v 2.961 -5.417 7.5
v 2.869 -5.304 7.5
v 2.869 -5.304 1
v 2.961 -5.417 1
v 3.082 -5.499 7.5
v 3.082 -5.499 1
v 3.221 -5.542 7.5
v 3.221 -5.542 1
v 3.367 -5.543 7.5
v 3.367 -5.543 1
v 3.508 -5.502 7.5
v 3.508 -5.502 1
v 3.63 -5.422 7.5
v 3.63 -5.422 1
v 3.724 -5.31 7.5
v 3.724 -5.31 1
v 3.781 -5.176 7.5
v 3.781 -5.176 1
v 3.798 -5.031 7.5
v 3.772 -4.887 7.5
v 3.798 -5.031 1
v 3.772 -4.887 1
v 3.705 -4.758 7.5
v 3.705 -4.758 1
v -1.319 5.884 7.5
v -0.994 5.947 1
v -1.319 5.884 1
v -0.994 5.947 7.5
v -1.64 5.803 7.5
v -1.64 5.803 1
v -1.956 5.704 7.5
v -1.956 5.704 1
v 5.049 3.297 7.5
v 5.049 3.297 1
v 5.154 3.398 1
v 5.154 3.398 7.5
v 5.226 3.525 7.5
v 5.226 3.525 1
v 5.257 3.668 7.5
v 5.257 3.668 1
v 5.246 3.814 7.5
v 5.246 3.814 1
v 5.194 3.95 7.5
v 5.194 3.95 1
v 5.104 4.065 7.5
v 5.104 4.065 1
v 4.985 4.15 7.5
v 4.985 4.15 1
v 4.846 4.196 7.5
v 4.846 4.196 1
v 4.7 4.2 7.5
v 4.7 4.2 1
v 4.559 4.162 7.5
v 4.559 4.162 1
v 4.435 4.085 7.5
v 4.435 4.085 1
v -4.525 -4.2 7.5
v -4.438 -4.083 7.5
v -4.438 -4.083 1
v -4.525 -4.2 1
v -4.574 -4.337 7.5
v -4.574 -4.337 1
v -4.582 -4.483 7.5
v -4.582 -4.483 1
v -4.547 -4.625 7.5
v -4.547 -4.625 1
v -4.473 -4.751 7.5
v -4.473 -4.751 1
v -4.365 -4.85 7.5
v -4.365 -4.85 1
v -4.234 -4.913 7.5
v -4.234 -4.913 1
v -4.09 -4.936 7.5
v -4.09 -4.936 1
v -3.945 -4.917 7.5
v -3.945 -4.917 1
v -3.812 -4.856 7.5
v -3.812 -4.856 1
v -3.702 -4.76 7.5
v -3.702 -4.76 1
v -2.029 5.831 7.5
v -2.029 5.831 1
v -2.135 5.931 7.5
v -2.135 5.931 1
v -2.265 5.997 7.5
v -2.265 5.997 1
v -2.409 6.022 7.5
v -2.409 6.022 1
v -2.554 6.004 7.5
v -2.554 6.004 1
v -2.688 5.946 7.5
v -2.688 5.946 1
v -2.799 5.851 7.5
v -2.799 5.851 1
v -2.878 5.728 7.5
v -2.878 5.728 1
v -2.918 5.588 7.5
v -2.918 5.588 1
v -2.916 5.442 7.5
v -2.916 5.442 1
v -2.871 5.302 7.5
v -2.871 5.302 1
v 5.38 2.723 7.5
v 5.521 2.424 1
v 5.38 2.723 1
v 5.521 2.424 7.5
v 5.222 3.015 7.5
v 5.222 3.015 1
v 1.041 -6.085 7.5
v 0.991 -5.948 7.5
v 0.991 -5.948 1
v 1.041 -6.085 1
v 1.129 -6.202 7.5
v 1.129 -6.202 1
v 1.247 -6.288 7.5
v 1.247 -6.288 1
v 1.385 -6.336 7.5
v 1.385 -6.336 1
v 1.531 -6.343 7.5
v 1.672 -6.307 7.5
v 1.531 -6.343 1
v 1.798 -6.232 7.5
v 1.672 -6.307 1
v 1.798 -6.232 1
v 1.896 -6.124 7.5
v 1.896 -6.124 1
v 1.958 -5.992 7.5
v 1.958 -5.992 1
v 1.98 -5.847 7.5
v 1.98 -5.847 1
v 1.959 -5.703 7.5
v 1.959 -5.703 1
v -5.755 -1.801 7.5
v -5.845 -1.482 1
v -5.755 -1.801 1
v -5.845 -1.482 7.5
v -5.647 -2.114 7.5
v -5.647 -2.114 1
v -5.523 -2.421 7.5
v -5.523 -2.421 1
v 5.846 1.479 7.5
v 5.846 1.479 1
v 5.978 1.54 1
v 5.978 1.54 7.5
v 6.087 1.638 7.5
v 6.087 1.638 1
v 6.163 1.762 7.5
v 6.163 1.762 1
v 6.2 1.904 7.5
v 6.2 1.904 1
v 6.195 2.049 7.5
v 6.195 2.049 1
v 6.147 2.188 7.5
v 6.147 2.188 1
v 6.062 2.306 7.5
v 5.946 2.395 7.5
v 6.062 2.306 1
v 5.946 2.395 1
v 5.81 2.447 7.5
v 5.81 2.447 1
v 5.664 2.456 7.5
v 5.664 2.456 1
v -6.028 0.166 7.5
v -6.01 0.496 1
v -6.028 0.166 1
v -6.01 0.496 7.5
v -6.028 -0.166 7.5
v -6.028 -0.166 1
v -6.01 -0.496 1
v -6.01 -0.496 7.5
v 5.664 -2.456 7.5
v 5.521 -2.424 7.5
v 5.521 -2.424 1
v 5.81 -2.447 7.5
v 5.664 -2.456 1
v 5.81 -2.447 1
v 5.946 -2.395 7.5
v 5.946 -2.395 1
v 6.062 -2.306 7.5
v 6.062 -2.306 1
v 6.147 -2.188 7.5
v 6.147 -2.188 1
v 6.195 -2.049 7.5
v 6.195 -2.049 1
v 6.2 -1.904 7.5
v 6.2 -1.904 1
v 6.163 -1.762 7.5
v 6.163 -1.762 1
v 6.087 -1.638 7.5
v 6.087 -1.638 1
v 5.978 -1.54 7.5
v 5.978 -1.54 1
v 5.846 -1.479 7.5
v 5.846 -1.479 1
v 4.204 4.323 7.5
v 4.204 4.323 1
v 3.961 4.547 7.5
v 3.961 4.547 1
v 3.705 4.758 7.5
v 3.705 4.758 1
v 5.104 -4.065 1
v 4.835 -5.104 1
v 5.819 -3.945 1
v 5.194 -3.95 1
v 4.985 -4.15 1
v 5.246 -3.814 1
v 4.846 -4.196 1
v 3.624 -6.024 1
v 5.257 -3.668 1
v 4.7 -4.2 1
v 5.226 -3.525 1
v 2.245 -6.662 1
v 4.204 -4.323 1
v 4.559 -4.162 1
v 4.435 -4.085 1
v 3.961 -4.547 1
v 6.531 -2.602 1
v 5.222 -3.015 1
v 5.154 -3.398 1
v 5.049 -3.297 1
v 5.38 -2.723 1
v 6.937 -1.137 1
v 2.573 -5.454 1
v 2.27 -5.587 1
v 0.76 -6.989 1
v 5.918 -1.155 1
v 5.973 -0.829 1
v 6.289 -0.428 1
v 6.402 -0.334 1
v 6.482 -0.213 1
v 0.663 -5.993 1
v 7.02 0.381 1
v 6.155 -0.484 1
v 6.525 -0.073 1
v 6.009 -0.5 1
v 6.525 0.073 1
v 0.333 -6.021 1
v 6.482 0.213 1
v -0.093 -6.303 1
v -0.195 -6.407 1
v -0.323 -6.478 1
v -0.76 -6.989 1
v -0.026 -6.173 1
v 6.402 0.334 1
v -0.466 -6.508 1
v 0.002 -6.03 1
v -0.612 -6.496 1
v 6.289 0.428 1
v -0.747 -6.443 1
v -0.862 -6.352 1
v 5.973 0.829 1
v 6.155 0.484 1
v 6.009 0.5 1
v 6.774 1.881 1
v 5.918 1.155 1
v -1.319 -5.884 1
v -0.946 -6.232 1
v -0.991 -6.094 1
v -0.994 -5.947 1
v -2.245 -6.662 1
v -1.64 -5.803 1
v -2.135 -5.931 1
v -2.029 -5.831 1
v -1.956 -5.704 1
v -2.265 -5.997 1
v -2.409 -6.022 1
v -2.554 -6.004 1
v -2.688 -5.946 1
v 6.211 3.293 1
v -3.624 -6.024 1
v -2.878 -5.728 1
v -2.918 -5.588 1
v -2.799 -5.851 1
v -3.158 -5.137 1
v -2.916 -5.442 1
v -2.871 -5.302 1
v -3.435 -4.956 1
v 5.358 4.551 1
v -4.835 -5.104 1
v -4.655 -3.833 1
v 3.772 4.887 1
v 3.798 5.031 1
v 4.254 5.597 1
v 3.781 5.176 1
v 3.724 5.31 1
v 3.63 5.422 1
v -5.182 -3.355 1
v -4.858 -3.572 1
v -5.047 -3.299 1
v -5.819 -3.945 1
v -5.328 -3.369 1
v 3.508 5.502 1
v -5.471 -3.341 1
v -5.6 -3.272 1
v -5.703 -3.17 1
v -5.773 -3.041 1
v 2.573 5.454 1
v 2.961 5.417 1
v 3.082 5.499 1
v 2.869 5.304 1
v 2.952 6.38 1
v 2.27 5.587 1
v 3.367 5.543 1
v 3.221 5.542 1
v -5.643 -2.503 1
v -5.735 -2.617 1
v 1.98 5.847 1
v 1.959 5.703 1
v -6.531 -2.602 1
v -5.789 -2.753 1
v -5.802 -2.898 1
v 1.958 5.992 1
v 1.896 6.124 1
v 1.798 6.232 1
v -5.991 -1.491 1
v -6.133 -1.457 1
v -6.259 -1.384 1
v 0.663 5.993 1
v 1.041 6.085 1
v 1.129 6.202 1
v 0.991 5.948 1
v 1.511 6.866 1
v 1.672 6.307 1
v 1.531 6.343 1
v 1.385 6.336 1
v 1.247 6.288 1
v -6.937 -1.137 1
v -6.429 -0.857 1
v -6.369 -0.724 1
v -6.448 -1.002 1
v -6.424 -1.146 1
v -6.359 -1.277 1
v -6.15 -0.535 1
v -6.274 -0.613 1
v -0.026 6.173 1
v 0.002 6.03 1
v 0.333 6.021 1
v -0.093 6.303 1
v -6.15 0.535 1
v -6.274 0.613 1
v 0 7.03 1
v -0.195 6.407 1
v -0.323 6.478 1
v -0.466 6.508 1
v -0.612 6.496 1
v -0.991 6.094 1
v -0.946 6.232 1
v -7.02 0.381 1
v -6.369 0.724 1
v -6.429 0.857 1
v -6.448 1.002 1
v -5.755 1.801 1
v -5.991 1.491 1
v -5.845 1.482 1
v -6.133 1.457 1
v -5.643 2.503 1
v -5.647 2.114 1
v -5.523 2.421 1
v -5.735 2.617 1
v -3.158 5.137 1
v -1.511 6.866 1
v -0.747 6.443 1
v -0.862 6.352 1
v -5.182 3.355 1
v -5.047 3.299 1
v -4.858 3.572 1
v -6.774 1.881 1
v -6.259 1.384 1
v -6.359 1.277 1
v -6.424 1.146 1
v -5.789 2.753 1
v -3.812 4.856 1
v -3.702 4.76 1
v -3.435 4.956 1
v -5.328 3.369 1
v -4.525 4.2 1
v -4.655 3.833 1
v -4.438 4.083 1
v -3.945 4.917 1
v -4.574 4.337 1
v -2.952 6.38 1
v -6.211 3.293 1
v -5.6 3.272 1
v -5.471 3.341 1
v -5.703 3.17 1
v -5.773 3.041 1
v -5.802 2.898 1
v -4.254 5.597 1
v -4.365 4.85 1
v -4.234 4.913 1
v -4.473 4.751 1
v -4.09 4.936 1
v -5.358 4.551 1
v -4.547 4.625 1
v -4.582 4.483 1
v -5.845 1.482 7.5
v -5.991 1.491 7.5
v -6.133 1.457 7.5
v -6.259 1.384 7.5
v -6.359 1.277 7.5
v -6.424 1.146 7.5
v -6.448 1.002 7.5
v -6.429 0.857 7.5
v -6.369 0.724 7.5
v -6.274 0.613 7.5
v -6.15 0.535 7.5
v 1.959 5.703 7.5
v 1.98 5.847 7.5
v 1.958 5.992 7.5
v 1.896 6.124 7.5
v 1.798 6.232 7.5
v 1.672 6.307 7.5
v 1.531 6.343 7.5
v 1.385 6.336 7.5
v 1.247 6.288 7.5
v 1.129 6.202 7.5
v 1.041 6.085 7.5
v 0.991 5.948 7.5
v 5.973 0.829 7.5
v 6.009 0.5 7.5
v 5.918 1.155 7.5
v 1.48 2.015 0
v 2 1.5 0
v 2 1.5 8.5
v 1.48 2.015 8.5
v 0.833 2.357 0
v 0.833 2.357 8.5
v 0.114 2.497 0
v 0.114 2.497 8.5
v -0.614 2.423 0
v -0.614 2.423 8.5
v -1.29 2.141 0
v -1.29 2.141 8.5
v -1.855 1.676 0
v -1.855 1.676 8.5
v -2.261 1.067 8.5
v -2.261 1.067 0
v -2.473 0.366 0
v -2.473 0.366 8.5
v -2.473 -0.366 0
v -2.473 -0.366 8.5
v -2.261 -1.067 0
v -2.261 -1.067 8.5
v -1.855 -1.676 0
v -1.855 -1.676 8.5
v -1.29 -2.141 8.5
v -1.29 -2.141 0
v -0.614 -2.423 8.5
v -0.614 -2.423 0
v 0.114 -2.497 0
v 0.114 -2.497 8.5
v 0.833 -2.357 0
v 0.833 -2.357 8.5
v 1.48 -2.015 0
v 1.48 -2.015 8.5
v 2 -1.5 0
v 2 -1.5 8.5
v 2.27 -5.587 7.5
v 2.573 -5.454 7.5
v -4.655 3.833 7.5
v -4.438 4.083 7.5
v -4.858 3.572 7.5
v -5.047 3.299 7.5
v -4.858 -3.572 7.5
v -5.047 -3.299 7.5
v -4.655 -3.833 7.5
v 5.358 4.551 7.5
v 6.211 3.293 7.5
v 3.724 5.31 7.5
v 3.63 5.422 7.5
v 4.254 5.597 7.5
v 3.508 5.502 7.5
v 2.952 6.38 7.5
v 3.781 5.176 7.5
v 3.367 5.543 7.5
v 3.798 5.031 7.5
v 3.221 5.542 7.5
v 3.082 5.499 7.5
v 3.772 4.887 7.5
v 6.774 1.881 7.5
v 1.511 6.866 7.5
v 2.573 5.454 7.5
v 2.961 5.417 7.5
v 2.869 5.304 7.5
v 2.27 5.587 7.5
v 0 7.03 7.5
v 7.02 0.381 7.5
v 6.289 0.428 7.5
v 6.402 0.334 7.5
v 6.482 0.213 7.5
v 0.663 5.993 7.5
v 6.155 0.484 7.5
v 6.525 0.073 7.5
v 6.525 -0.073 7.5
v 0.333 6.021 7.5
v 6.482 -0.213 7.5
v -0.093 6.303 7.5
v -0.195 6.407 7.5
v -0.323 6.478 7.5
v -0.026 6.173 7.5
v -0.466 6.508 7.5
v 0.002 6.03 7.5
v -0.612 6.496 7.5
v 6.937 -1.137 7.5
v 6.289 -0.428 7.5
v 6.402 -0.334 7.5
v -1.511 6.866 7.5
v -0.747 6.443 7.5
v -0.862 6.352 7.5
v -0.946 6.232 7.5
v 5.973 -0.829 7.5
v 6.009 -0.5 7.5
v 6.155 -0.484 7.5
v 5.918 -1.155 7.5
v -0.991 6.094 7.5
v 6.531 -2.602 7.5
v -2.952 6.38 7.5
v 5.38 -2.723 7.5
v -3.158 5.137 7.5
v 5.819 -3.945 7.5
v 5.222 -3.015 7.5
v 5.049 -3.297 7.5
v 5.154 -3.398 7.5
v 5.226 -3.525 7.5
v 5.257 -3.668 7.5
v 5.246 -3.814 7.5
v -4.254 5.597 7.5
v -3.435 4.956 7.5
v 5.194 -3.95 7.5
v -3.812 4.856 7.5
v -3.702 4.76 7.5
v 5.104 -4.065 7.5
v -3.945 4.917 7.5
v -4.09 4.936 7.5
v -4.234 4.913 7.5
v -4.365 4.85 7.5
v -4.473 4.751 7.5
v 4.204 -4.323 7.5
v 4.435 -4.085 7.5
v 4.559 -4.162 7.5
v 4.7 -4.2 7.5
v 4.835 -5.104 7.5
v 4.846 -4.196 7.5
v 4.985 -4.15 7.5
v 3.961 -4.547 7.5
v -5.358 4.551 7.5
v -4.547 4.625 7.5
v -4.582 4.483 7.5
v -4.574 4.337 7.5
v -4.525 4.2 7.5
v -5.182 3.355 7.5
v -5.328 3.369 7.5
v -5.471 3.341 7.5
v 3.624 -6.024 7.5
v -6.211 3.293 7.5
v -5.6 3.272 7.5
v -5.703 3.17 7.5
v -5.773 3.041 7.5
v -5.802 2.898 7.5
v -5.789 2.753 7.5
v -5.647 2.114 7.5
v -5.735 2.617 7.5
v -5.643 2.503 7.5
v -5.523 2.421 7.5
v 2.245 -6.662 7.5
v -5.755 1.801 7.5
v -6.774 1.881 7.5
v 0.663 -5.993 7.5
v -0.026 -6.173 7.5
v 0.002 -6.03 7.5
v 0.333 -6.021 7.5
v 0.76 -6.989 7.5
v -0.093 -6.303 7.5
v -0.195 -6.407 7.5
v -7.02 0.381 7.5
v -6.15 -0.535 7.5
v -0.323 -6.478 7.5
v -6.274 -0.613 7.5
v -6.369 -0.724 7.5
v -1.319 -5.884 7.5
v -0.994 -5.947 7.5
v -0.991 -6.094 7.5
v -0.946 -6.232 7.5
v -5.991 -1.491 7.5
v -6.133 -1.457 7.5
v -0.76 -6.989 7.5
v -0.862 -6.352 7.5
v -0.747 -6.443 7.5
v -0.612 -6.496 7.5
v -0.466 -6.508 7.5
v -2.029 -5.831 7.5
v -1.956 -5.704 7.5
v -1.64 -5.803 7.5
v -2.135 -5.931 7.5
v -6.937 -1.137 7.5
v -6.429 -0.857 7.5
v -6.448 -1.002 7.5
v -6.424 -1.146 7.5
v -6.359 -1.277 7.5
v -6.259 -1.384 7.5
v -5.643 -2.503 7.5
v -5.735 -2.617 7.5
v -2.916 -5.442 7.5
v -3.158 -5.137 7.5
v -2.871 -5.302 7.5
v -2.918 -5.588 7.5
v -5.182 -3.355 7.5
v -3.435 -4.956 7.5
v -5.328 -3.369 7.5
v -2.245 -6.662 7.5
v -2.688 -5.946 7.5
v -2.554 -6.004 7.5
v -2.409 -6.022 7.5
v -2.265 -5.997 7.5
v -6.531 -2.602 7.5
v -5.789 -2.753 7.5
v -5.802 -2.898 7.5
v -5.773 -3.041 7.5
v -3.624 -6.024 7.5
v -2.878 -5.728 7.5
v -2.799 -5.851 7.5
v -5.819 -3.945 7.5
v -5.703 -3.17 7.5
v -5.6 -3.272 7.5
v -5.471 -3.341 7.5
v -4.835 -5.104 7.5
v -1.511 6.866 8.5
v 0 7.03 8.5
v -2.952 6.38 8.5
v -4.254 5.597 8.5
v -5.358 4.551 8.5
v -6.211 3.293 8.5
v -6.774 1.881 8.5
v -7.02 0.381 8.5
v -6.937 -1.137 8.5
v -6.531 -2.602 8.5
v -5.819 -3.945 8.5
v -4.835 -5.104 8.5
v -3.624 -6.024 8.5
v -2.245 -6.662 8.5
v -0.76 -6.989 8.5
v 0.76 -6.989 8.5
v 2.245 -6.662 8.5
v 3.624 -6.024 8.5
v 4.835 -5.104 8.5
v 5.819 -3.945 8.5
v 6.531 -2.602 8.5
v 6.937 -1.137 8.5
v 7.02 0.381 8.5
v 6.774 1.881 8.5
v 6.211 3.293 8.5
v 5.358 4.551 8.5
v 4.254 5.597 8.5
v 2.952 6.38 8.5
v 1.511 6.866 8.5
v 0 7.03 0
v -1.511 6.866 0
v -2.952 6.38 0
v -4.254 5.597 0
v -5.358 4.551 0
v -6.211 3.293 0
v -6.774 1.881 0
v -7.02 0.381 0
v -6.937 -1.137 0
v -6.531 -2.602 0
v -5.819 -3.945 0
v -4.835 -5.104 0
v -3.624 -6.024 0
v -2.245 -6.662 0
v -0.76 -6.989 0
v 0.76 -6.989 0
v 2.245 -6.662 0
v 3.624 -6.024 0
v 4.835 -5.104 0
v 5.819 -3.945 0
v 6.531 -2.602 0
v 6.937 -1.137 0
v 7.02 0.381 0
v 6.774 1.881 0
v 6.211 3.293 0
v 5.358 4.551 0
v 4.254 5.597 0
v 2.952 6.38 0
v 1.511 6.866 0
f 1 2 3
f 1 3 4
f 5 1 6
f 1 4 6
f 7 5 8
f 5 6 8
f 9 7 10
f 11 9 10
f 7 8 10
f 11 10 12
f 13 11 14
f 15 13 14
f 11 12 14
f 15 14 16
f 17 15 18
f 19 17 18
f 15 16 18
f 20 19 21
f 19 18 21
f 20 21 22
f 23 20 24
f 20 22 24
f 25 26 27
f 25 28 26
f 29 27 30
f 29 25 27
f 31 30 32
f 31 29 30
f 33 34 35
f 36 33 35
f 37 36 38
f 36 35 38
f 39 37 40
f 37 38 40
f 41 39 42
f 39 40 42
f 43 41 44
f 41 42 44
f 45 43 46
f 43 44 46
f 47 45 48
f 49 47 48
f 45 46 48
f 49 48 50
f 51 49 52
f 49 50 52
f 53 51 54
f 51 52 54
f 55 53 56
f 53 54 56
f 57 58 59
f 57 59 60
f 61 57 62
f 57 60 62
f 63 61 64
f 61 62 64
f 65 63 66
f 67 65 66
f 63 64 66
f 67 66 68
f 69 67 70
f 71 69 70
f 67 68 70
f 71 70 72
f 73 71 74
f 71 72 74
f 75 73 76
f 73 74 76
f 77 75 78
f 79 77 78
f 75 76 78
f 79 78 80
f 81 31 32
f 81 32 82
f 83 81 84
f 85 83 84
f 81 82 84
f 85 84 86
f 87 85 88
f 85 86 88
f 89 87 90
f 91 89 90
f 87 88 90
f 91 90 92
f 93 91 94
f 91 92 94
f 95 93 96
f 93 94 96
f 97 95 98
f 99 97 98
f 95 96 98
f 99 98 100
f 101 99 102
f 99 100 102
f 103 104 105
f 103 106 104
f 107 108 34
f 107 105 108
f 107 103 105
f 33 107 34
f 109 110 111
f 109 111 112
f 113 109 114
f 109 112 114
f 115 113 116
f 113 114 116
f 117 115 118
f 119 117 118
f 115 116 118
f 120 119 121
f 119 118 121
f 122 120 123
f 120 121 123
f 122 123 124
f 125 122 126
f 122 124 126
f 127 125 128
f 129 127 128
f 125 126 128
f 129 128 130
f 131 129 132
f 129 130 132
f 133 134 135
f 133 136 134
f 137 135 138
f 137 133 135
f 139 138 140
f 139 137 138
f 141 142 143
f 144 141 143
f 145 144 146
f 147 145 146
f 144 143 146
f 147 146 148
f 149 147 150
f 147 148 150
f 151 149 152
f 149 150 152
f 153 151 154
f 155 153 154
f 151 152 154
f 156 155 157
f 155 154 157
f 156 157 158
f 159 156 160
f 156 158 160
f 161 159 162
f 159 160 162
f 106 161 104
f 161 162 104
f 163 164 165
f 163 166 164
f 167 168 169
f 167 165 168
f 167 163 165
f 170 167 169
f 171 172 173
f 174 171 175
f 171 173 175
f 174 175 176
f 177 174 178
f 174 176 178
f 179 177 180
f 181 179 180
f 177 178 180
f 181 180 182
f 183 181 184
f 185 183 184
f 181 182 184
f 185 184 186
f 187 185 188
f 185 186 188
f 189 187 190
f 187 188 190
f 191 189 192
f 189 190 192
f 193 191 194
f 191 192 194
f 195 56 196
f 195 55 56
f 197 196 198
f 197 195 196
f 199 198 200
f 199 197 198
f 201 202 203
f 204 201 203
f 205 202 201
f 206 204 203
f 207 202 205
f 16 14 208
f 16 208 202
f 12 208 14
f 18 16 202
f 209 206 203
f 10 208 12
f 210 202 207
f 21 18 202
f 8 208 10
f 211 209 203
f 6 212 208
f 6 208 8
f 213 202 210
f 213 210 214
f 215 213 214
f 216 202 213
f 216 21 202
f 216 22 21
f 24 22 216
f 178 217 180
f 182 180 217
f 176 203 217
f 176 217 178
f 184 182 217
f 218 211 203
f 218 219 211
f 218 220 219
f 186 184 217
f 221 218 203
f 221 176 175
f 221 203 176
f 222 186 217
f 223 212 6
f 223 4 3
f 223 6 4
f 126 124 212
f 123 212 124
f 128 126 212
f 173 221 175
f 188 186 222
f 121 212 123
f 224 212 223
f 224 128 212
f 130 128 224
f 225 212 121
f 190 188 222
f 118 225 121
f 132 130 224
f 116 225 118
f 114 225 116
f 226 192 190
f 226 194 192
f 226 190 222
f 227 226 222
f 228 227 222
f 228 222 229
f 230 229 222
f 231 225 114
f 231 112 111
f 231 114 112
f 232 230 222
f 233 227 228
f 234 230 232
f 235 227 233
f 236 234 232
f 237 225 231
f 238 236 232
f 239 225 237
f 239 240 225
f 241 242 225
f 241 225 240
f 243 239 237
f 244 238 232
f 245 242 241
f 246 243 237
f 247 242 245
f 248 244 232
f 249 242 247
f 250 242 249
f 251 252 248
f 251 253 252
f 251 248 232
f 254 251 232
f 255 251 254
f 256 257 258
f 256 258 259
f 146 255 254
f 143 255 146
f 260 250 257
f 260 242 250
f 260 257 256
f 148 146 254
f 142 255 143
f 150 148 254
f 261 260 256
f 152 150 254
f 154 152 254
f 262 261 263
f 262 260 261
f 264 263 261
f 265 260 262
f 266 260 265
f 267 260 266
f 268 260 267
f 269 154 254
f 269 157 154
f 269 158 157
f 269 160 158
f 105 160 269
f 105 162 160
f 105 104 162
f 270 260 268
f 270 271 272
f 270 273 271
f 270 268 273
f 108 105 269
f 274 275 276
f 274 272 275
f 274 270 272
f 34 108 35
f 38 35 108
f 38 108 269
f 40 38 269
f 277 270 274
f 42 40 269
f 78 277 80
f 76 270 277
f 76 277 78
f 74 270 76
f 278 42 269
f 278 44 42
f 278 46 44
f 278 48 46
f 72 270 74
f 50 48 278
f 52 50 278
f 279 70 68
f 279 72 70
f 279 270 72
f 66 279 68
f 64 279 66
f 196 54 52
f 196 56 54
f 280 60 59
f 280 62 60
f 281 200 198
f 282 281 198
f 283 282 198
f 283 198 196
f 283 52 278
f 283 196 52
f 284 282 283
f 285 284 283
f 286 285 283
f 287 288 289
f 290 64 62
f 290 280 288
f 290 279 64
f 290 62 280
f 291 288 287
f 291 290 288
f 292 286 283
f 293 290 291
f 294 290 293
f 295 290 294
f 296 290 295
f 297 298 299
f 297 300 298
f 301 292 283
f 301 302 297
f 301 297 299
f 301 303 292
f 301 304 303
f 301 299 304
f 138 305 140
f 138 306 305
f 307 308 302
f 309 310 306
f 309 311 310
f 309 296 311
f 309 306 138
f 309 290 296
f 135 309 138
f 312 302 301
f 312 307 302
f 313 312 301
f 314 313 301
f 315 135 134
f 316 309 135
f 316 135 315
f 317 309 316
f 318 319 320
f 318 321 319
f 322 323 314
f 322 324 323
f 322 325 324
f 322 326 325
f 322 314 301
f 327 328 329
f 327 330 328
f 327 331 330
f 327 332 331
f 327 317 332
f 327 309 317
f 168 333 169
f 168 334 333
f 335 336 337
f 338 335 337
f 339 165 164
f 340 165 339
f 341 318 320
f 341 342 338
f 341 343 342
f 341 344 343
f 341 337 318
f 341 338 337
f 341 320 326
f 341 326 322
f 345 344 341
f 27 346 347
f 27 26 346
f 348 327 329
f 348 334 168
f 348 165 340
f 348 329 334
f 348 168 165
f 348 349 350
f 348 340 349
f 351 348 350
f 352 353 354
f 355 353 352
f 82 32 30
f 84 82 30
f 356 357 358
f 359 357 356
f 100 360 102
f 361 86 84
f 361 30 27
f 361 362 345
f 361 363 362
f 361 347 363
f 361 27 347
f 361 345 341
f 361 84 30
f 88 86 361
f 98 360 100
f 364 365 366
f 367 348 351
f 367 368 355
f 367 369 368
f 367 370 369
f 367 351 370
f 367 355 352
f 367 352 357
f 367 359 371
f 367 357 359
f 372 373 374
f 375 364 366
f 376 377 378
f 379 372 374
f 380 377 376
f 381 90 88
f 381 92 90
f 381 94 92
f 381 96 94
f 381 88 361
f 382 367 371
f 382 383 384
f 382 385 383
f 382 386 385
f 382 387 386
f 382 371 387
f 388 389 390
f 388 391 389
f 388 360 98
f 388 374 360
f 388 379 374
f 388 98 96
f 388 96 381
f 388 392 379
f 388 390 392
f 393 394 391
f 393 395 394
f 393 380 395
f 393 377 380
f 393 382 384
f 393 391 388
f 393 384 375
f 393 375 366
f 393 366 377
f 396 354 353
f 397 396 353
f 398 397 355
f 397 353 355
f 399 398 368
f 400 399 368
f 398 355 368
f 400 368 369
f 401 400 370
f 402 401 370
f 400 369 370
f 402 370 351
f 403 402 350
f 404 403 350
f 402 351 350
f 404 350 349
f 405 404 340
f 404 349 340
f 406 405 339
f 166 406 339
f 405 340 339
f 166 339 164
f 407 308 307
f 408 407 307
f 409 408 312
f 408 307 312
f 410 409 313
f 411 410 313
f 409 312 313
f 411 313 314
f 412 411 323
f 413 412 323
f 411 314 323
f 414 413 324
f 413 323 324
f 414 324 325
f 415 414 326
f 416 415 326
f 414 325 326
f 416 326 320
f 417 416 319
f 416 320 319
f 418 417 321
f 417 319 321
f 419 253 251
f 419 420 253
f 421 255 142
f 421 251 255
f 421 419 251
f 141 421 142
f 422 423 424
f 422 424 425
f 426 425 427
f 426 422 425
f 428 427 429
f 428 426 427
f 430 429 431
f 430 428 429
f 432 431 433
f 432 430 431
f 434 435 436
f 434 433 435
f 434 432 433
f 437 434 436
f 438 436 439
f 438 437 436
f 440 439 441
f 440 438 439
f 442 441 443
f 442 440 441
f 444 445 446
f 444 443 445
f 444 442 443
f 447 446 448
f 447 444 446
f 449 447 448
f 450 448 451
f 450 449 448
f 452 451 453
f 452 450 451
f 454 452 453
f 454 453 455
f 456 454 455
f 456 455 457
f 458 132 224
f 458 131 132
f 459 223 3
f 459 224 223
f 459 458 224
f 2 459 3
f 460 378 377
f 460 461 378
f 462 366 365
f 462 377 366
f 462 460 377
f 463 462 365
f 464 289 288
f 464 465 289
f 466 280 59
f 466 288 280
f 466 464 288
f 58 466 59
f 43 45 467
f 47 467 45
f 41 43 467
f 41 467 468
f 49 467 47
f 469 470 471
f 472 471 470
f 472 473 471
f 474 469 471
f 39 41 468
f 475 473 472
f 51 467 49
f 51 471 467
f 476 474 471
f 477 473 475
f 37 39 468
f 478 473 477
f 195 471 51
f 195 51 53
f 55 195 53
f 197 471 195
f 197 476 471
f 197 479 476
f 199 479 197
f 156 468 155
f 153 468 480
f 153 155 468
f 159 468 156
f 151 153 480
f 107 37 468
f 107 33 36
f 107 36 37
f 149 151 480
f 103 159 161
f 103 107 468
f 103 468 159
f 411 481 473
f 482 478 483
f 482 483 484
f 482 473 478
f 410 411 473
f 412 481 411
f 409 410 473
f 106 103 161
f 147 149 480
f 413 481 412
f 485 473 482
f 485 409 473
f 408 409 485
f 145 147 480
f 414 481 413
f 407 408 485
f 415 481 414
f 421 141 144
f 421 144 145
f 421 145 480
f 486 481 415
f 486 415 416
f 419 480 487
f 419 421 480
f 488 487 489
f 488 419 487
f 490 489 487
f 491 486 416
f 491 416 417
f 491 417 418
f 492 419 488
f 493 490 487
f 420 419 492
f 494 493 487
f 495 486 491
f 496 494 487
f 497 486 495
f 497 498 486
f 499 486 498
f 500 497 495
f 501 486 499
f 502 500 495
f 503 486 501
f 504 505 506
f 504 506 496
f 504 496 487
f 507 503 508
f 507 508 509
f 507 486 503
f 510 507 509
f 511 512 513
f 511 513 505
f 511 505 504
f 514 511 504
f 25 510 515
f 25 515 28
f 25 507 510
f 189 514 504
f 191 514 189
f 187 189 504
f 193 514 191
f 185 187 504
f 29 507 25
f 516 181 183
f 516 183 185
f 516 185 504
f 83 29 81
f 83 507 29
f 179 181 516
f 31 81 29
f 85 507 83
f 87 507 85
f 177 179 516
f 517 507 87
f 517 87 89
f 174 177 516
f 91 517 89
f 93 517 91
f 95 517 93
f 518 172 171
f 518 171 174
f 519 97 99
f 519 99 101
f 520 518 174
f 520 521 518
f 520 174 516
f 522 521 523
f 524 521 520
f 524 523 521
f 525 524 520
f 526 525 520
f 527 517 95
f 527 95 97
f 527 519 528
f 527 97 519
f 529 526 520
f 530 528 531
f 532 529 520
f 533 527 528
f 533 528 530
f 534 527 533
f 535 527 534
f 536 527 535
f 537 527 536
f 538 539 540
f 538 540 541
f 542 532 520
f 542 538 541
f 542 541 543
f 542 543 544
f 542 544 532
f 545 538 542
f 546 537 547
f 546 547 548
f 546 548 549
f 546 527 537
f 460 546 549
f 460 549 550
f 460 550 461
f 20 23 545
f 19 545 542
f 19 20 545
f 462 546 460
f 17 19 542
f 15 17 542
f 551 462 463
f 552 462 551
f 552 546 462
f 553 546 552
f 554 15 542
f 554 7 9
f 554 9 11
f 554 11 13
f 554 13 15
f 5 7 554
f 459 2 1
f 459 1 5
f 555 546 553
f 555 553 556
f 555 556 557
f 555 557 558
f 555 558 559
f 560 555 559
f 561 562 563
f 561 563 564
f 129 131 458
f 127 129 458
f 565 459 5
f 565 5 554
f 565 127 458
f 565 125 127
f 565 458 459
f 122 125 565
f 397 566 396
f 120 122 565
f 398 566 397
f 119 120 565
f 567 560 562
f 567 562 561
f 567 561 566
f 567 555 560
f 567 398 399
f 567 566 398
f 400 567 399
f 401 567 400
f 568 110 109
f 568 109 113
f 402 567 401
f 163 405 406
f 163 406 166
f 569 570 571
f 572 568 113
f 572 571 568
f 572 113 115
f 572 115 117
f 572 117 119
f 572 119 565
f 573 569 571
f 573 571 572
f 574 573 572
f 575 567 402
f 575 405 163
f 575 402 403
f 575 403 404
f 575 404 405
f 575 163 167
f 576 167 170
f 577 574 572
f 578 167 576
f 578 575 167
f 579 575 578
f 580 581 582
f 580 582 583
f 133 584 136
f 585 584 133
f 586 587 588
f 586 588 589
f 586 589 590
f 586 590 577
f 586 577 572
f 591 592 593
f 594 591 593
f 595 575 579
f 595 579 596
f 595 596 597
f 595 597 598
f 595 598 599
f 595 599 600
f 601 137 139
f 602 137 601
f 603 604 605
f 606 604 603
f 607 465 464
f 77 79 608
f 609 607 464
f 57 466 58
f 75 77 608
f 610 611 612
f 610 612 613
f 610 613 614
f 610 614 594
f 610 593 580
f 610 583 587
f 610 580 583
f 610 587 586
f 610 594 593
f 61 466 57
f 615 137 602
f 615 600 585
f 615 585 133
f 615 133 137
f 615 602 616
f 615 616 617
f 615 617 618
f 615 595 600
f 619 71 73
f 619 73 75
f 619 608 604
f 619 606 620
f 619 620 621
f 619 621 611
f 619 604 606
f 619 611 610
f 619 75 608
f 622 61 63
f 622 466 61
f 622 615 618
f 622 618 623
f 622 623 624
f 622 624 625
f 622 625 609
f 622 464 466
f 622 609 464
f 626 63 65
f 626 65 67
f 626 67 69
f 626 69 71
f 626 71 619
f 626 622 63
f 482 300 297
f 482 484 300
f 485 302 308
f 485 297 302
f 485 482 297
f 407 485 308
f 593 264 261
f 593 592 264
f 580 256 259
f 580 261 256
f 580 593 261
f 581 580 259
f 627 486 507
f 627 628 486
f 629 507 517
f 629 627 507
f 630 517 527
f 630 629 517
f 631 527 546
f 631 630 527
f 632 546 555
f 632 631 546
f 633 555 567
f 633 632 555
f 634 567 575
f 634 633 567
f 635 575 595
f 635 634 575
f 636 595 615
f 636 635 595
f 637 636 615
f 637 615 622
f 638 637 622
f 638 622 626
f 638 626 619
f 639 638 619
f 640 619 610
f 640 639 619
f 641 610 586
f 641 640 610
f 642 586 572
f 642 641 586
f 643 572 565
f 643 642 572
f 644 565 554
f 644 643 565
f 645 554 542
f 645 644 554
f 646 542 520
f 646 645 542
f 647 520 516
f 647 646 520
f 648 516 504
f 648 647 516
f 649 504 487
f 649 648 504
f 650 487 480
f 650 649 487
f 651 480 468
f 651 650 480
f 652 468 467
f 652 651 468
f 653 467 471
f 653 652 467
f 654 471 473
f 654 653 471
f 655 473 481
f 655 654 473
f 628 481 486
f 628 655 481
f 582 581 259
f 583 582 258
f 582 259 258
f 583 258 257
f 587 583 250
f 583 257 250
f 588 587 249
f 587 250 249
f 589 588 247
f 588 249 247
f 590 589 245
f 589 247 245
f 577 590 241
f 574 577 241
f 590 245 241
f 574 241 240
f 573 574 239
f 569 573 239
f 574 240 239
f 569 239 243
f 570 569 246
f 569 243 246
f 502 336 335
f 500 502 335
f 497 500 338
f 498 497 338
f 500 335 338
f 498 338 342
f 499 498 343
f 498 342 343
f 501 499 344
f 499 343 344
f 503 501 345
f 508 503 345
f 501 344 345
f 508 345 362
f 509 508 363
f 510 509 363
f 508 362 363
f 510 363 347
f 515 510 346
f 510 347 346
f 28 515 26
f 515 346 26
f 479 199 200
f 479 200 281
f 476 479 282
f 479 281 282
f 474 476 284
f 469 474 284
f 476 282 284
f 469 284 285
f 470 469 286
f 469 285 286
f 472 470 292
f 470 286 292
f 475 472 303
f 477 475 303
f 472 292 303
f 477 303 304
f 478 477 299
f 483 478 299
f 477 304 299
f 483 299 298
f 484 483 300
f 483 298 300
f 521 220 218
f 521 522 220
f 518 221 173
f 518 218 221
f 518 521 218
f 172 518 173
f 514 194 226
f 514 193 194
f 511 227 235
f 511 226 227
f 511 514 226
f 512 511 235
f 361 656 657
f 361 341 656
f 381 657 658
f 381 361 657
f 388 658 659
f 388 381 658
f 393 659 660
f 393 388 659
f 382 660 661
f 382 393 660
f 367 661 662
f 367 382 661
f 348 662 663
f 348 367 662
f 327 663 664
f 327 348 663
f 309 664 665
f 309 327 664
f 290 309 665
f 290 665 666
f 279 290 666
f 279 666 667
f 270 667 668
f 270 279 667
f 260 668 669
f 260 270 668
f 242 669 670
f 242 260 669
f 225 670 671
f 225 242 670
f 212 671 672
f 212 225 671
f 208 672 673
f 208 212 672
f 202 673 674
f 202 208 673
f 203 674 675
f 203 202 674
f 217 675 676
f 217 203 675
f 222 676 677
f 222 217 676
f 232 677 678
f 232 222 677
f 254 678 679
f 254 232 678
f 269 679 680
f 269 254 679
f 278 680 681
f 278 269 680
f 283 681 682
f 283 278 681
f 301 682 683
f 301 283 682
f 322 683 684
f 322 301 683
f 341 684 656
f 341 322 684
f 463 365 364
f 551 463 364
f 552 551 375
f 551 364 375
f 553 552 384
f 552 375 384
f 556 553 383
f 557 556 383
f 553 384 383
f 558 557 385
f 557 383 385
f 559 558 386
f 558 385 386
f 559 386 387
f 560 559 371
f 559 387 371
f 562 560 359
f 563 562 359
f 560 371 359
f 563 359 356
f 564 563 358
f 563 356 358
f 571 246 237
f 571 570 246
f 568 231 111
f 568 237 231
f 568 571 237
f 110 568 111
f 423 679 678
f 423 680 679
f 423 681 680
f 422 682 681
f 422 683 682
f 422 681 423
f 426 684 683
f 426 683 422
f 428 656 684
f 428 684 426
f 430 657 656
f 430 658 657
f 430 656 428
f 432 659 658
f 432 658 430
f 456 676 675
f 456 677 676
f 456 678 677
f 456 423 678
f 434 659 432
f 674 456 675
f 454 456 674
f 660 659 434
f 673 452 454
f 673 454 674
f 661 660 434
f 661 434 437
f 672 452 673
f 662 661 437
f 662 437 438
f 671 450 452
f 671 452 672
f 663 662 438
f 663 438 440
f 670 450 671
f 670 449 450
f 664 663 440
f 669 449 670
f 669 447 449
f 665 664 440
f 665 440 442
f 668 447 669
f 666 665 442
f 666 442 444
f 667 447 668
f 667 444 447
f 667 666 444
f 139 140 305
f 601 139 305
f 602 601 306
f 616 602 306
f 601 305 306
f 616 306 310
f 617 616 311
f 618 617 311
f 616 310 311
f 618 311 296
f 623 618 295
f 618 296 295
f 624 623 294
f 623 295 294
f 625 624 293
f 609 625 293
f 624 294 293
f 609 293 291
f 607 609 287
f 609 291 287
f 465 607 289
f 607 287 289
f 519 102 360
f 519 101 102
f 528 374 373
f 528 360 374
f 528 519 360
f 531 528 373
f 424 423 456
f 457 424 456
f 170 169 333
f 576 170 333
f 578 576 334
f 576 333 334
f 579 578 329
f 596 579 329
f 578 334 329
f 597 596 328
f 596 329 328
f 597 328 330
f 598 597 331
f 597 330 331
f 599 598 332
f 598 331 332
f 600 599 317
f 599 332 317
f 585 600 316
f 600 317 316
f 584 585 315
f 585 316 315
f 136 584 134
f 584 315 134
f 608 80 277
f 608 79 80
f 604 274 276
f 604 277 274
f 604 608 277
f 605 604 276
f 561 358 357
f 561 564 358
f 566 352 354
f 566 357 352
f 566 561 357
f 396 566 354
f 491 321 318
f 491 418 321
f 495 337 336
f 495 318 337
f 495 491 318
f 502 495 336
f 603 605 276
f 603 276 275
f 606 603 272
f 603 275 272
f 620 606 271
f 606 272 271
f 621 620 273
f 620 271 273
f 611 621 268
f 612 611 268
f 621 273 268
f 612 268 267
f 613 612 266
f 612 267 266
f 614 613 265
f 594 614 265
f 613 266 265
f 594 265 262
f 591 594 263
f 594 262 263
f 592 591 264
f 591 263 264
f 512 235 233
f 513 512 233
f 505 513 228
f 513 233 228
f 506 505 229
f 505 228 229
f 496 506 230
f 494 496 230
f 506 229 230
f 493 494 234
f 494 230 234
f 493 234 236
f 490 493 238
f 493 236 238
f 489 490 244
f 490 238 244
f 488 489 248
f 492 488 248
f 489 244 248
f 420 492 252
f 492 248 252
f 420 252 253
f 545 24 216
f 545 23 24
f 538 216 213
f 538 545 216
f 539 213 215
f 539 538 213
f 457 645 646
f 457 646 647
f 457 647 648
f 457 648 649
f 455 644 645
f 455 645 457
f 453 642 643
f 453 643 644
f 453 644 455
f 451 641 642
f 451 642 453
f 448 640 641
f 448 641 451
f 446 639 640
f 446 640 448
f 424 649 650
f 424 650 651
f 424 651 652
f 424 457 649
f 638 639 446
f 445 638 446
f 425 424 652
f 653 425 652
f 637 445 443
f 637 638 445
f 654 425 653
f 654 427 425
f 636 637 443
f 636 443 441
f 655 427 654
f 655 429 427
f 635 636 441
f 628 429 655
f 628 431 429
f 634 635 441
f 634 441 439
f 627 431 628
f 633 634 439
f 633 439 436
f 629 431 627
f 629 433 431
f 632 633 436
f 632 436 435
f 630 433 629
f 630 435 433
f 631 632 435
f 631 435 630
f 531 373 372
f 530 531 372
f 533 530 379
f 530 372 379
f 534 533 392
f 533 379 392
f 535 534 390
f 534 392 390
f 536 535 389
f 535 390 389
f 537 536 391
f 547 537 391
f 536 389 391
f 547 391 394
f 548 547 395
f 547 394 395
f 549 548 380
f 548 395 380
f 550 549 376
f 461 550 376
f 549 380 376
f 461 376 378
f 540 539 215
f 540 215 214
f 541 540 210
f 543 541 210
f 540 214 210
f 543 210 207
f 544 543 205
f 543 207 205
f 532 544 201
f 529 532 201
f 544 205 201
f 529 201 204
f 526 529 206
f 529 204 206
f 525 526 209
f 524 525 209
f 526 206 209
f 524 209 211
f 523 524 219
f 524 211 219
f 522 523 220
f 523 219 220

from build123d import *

# Parameters (mm, degrees)
PAD014_DEPTH       = 6.5
POLARPATTERN_COUNT = 19
PAD015_DEPTH       = 8.5


with BuildPart() as part:
    # Sketch031 → Revolution002 (revolve)
    with BuildSketch(Plane.YZ):
        Polygon((2.5, 0), (7.03, 0), (7.03, 1), (6.03, 1), (6.03, 7.5), (7.03, 7.5), (7.03, 8.5), (2.5, 8.5), align=None)
    revolve(axis=Axis((0, 0, 0), (0, 0, 1)))

    # Sketch029 → Pad014 (new body)
    with BuildSketch(Plane.XY.offset(1)):
        with BuildLine():
            ThreePointArc((5.78, -0.433013), (6.53, 0), (5.78, 0.433013))
            Line((5.78, 0.433013), (5.78, -0.433013))
        make_face()
    pad014 = extrude(amount=PAD014_DEPTH)

    # PolarPattern: Pad014 ×19 about axis
    polarpattern_axis = Axis((0, 0, 1), (0, 0, 1))
    for i in range(1, POLARPATTERN_COUNT):
        add(pad014.rotate(polarpattern_axis, i * 360 / POLARPATTERN_COUNT))

    # Sketch032 → Pad015 (join)
    with BuildSketch(Plane.XY):
        with BuildLine():
            ThreePointArc((2, -1.5), (2.5, 0), (2, 1.5))
            Line((2, 1.5), (2, -1.5))
        make_face()
    extrude(amount=PAD015_DEPTH)


solid = part.part
